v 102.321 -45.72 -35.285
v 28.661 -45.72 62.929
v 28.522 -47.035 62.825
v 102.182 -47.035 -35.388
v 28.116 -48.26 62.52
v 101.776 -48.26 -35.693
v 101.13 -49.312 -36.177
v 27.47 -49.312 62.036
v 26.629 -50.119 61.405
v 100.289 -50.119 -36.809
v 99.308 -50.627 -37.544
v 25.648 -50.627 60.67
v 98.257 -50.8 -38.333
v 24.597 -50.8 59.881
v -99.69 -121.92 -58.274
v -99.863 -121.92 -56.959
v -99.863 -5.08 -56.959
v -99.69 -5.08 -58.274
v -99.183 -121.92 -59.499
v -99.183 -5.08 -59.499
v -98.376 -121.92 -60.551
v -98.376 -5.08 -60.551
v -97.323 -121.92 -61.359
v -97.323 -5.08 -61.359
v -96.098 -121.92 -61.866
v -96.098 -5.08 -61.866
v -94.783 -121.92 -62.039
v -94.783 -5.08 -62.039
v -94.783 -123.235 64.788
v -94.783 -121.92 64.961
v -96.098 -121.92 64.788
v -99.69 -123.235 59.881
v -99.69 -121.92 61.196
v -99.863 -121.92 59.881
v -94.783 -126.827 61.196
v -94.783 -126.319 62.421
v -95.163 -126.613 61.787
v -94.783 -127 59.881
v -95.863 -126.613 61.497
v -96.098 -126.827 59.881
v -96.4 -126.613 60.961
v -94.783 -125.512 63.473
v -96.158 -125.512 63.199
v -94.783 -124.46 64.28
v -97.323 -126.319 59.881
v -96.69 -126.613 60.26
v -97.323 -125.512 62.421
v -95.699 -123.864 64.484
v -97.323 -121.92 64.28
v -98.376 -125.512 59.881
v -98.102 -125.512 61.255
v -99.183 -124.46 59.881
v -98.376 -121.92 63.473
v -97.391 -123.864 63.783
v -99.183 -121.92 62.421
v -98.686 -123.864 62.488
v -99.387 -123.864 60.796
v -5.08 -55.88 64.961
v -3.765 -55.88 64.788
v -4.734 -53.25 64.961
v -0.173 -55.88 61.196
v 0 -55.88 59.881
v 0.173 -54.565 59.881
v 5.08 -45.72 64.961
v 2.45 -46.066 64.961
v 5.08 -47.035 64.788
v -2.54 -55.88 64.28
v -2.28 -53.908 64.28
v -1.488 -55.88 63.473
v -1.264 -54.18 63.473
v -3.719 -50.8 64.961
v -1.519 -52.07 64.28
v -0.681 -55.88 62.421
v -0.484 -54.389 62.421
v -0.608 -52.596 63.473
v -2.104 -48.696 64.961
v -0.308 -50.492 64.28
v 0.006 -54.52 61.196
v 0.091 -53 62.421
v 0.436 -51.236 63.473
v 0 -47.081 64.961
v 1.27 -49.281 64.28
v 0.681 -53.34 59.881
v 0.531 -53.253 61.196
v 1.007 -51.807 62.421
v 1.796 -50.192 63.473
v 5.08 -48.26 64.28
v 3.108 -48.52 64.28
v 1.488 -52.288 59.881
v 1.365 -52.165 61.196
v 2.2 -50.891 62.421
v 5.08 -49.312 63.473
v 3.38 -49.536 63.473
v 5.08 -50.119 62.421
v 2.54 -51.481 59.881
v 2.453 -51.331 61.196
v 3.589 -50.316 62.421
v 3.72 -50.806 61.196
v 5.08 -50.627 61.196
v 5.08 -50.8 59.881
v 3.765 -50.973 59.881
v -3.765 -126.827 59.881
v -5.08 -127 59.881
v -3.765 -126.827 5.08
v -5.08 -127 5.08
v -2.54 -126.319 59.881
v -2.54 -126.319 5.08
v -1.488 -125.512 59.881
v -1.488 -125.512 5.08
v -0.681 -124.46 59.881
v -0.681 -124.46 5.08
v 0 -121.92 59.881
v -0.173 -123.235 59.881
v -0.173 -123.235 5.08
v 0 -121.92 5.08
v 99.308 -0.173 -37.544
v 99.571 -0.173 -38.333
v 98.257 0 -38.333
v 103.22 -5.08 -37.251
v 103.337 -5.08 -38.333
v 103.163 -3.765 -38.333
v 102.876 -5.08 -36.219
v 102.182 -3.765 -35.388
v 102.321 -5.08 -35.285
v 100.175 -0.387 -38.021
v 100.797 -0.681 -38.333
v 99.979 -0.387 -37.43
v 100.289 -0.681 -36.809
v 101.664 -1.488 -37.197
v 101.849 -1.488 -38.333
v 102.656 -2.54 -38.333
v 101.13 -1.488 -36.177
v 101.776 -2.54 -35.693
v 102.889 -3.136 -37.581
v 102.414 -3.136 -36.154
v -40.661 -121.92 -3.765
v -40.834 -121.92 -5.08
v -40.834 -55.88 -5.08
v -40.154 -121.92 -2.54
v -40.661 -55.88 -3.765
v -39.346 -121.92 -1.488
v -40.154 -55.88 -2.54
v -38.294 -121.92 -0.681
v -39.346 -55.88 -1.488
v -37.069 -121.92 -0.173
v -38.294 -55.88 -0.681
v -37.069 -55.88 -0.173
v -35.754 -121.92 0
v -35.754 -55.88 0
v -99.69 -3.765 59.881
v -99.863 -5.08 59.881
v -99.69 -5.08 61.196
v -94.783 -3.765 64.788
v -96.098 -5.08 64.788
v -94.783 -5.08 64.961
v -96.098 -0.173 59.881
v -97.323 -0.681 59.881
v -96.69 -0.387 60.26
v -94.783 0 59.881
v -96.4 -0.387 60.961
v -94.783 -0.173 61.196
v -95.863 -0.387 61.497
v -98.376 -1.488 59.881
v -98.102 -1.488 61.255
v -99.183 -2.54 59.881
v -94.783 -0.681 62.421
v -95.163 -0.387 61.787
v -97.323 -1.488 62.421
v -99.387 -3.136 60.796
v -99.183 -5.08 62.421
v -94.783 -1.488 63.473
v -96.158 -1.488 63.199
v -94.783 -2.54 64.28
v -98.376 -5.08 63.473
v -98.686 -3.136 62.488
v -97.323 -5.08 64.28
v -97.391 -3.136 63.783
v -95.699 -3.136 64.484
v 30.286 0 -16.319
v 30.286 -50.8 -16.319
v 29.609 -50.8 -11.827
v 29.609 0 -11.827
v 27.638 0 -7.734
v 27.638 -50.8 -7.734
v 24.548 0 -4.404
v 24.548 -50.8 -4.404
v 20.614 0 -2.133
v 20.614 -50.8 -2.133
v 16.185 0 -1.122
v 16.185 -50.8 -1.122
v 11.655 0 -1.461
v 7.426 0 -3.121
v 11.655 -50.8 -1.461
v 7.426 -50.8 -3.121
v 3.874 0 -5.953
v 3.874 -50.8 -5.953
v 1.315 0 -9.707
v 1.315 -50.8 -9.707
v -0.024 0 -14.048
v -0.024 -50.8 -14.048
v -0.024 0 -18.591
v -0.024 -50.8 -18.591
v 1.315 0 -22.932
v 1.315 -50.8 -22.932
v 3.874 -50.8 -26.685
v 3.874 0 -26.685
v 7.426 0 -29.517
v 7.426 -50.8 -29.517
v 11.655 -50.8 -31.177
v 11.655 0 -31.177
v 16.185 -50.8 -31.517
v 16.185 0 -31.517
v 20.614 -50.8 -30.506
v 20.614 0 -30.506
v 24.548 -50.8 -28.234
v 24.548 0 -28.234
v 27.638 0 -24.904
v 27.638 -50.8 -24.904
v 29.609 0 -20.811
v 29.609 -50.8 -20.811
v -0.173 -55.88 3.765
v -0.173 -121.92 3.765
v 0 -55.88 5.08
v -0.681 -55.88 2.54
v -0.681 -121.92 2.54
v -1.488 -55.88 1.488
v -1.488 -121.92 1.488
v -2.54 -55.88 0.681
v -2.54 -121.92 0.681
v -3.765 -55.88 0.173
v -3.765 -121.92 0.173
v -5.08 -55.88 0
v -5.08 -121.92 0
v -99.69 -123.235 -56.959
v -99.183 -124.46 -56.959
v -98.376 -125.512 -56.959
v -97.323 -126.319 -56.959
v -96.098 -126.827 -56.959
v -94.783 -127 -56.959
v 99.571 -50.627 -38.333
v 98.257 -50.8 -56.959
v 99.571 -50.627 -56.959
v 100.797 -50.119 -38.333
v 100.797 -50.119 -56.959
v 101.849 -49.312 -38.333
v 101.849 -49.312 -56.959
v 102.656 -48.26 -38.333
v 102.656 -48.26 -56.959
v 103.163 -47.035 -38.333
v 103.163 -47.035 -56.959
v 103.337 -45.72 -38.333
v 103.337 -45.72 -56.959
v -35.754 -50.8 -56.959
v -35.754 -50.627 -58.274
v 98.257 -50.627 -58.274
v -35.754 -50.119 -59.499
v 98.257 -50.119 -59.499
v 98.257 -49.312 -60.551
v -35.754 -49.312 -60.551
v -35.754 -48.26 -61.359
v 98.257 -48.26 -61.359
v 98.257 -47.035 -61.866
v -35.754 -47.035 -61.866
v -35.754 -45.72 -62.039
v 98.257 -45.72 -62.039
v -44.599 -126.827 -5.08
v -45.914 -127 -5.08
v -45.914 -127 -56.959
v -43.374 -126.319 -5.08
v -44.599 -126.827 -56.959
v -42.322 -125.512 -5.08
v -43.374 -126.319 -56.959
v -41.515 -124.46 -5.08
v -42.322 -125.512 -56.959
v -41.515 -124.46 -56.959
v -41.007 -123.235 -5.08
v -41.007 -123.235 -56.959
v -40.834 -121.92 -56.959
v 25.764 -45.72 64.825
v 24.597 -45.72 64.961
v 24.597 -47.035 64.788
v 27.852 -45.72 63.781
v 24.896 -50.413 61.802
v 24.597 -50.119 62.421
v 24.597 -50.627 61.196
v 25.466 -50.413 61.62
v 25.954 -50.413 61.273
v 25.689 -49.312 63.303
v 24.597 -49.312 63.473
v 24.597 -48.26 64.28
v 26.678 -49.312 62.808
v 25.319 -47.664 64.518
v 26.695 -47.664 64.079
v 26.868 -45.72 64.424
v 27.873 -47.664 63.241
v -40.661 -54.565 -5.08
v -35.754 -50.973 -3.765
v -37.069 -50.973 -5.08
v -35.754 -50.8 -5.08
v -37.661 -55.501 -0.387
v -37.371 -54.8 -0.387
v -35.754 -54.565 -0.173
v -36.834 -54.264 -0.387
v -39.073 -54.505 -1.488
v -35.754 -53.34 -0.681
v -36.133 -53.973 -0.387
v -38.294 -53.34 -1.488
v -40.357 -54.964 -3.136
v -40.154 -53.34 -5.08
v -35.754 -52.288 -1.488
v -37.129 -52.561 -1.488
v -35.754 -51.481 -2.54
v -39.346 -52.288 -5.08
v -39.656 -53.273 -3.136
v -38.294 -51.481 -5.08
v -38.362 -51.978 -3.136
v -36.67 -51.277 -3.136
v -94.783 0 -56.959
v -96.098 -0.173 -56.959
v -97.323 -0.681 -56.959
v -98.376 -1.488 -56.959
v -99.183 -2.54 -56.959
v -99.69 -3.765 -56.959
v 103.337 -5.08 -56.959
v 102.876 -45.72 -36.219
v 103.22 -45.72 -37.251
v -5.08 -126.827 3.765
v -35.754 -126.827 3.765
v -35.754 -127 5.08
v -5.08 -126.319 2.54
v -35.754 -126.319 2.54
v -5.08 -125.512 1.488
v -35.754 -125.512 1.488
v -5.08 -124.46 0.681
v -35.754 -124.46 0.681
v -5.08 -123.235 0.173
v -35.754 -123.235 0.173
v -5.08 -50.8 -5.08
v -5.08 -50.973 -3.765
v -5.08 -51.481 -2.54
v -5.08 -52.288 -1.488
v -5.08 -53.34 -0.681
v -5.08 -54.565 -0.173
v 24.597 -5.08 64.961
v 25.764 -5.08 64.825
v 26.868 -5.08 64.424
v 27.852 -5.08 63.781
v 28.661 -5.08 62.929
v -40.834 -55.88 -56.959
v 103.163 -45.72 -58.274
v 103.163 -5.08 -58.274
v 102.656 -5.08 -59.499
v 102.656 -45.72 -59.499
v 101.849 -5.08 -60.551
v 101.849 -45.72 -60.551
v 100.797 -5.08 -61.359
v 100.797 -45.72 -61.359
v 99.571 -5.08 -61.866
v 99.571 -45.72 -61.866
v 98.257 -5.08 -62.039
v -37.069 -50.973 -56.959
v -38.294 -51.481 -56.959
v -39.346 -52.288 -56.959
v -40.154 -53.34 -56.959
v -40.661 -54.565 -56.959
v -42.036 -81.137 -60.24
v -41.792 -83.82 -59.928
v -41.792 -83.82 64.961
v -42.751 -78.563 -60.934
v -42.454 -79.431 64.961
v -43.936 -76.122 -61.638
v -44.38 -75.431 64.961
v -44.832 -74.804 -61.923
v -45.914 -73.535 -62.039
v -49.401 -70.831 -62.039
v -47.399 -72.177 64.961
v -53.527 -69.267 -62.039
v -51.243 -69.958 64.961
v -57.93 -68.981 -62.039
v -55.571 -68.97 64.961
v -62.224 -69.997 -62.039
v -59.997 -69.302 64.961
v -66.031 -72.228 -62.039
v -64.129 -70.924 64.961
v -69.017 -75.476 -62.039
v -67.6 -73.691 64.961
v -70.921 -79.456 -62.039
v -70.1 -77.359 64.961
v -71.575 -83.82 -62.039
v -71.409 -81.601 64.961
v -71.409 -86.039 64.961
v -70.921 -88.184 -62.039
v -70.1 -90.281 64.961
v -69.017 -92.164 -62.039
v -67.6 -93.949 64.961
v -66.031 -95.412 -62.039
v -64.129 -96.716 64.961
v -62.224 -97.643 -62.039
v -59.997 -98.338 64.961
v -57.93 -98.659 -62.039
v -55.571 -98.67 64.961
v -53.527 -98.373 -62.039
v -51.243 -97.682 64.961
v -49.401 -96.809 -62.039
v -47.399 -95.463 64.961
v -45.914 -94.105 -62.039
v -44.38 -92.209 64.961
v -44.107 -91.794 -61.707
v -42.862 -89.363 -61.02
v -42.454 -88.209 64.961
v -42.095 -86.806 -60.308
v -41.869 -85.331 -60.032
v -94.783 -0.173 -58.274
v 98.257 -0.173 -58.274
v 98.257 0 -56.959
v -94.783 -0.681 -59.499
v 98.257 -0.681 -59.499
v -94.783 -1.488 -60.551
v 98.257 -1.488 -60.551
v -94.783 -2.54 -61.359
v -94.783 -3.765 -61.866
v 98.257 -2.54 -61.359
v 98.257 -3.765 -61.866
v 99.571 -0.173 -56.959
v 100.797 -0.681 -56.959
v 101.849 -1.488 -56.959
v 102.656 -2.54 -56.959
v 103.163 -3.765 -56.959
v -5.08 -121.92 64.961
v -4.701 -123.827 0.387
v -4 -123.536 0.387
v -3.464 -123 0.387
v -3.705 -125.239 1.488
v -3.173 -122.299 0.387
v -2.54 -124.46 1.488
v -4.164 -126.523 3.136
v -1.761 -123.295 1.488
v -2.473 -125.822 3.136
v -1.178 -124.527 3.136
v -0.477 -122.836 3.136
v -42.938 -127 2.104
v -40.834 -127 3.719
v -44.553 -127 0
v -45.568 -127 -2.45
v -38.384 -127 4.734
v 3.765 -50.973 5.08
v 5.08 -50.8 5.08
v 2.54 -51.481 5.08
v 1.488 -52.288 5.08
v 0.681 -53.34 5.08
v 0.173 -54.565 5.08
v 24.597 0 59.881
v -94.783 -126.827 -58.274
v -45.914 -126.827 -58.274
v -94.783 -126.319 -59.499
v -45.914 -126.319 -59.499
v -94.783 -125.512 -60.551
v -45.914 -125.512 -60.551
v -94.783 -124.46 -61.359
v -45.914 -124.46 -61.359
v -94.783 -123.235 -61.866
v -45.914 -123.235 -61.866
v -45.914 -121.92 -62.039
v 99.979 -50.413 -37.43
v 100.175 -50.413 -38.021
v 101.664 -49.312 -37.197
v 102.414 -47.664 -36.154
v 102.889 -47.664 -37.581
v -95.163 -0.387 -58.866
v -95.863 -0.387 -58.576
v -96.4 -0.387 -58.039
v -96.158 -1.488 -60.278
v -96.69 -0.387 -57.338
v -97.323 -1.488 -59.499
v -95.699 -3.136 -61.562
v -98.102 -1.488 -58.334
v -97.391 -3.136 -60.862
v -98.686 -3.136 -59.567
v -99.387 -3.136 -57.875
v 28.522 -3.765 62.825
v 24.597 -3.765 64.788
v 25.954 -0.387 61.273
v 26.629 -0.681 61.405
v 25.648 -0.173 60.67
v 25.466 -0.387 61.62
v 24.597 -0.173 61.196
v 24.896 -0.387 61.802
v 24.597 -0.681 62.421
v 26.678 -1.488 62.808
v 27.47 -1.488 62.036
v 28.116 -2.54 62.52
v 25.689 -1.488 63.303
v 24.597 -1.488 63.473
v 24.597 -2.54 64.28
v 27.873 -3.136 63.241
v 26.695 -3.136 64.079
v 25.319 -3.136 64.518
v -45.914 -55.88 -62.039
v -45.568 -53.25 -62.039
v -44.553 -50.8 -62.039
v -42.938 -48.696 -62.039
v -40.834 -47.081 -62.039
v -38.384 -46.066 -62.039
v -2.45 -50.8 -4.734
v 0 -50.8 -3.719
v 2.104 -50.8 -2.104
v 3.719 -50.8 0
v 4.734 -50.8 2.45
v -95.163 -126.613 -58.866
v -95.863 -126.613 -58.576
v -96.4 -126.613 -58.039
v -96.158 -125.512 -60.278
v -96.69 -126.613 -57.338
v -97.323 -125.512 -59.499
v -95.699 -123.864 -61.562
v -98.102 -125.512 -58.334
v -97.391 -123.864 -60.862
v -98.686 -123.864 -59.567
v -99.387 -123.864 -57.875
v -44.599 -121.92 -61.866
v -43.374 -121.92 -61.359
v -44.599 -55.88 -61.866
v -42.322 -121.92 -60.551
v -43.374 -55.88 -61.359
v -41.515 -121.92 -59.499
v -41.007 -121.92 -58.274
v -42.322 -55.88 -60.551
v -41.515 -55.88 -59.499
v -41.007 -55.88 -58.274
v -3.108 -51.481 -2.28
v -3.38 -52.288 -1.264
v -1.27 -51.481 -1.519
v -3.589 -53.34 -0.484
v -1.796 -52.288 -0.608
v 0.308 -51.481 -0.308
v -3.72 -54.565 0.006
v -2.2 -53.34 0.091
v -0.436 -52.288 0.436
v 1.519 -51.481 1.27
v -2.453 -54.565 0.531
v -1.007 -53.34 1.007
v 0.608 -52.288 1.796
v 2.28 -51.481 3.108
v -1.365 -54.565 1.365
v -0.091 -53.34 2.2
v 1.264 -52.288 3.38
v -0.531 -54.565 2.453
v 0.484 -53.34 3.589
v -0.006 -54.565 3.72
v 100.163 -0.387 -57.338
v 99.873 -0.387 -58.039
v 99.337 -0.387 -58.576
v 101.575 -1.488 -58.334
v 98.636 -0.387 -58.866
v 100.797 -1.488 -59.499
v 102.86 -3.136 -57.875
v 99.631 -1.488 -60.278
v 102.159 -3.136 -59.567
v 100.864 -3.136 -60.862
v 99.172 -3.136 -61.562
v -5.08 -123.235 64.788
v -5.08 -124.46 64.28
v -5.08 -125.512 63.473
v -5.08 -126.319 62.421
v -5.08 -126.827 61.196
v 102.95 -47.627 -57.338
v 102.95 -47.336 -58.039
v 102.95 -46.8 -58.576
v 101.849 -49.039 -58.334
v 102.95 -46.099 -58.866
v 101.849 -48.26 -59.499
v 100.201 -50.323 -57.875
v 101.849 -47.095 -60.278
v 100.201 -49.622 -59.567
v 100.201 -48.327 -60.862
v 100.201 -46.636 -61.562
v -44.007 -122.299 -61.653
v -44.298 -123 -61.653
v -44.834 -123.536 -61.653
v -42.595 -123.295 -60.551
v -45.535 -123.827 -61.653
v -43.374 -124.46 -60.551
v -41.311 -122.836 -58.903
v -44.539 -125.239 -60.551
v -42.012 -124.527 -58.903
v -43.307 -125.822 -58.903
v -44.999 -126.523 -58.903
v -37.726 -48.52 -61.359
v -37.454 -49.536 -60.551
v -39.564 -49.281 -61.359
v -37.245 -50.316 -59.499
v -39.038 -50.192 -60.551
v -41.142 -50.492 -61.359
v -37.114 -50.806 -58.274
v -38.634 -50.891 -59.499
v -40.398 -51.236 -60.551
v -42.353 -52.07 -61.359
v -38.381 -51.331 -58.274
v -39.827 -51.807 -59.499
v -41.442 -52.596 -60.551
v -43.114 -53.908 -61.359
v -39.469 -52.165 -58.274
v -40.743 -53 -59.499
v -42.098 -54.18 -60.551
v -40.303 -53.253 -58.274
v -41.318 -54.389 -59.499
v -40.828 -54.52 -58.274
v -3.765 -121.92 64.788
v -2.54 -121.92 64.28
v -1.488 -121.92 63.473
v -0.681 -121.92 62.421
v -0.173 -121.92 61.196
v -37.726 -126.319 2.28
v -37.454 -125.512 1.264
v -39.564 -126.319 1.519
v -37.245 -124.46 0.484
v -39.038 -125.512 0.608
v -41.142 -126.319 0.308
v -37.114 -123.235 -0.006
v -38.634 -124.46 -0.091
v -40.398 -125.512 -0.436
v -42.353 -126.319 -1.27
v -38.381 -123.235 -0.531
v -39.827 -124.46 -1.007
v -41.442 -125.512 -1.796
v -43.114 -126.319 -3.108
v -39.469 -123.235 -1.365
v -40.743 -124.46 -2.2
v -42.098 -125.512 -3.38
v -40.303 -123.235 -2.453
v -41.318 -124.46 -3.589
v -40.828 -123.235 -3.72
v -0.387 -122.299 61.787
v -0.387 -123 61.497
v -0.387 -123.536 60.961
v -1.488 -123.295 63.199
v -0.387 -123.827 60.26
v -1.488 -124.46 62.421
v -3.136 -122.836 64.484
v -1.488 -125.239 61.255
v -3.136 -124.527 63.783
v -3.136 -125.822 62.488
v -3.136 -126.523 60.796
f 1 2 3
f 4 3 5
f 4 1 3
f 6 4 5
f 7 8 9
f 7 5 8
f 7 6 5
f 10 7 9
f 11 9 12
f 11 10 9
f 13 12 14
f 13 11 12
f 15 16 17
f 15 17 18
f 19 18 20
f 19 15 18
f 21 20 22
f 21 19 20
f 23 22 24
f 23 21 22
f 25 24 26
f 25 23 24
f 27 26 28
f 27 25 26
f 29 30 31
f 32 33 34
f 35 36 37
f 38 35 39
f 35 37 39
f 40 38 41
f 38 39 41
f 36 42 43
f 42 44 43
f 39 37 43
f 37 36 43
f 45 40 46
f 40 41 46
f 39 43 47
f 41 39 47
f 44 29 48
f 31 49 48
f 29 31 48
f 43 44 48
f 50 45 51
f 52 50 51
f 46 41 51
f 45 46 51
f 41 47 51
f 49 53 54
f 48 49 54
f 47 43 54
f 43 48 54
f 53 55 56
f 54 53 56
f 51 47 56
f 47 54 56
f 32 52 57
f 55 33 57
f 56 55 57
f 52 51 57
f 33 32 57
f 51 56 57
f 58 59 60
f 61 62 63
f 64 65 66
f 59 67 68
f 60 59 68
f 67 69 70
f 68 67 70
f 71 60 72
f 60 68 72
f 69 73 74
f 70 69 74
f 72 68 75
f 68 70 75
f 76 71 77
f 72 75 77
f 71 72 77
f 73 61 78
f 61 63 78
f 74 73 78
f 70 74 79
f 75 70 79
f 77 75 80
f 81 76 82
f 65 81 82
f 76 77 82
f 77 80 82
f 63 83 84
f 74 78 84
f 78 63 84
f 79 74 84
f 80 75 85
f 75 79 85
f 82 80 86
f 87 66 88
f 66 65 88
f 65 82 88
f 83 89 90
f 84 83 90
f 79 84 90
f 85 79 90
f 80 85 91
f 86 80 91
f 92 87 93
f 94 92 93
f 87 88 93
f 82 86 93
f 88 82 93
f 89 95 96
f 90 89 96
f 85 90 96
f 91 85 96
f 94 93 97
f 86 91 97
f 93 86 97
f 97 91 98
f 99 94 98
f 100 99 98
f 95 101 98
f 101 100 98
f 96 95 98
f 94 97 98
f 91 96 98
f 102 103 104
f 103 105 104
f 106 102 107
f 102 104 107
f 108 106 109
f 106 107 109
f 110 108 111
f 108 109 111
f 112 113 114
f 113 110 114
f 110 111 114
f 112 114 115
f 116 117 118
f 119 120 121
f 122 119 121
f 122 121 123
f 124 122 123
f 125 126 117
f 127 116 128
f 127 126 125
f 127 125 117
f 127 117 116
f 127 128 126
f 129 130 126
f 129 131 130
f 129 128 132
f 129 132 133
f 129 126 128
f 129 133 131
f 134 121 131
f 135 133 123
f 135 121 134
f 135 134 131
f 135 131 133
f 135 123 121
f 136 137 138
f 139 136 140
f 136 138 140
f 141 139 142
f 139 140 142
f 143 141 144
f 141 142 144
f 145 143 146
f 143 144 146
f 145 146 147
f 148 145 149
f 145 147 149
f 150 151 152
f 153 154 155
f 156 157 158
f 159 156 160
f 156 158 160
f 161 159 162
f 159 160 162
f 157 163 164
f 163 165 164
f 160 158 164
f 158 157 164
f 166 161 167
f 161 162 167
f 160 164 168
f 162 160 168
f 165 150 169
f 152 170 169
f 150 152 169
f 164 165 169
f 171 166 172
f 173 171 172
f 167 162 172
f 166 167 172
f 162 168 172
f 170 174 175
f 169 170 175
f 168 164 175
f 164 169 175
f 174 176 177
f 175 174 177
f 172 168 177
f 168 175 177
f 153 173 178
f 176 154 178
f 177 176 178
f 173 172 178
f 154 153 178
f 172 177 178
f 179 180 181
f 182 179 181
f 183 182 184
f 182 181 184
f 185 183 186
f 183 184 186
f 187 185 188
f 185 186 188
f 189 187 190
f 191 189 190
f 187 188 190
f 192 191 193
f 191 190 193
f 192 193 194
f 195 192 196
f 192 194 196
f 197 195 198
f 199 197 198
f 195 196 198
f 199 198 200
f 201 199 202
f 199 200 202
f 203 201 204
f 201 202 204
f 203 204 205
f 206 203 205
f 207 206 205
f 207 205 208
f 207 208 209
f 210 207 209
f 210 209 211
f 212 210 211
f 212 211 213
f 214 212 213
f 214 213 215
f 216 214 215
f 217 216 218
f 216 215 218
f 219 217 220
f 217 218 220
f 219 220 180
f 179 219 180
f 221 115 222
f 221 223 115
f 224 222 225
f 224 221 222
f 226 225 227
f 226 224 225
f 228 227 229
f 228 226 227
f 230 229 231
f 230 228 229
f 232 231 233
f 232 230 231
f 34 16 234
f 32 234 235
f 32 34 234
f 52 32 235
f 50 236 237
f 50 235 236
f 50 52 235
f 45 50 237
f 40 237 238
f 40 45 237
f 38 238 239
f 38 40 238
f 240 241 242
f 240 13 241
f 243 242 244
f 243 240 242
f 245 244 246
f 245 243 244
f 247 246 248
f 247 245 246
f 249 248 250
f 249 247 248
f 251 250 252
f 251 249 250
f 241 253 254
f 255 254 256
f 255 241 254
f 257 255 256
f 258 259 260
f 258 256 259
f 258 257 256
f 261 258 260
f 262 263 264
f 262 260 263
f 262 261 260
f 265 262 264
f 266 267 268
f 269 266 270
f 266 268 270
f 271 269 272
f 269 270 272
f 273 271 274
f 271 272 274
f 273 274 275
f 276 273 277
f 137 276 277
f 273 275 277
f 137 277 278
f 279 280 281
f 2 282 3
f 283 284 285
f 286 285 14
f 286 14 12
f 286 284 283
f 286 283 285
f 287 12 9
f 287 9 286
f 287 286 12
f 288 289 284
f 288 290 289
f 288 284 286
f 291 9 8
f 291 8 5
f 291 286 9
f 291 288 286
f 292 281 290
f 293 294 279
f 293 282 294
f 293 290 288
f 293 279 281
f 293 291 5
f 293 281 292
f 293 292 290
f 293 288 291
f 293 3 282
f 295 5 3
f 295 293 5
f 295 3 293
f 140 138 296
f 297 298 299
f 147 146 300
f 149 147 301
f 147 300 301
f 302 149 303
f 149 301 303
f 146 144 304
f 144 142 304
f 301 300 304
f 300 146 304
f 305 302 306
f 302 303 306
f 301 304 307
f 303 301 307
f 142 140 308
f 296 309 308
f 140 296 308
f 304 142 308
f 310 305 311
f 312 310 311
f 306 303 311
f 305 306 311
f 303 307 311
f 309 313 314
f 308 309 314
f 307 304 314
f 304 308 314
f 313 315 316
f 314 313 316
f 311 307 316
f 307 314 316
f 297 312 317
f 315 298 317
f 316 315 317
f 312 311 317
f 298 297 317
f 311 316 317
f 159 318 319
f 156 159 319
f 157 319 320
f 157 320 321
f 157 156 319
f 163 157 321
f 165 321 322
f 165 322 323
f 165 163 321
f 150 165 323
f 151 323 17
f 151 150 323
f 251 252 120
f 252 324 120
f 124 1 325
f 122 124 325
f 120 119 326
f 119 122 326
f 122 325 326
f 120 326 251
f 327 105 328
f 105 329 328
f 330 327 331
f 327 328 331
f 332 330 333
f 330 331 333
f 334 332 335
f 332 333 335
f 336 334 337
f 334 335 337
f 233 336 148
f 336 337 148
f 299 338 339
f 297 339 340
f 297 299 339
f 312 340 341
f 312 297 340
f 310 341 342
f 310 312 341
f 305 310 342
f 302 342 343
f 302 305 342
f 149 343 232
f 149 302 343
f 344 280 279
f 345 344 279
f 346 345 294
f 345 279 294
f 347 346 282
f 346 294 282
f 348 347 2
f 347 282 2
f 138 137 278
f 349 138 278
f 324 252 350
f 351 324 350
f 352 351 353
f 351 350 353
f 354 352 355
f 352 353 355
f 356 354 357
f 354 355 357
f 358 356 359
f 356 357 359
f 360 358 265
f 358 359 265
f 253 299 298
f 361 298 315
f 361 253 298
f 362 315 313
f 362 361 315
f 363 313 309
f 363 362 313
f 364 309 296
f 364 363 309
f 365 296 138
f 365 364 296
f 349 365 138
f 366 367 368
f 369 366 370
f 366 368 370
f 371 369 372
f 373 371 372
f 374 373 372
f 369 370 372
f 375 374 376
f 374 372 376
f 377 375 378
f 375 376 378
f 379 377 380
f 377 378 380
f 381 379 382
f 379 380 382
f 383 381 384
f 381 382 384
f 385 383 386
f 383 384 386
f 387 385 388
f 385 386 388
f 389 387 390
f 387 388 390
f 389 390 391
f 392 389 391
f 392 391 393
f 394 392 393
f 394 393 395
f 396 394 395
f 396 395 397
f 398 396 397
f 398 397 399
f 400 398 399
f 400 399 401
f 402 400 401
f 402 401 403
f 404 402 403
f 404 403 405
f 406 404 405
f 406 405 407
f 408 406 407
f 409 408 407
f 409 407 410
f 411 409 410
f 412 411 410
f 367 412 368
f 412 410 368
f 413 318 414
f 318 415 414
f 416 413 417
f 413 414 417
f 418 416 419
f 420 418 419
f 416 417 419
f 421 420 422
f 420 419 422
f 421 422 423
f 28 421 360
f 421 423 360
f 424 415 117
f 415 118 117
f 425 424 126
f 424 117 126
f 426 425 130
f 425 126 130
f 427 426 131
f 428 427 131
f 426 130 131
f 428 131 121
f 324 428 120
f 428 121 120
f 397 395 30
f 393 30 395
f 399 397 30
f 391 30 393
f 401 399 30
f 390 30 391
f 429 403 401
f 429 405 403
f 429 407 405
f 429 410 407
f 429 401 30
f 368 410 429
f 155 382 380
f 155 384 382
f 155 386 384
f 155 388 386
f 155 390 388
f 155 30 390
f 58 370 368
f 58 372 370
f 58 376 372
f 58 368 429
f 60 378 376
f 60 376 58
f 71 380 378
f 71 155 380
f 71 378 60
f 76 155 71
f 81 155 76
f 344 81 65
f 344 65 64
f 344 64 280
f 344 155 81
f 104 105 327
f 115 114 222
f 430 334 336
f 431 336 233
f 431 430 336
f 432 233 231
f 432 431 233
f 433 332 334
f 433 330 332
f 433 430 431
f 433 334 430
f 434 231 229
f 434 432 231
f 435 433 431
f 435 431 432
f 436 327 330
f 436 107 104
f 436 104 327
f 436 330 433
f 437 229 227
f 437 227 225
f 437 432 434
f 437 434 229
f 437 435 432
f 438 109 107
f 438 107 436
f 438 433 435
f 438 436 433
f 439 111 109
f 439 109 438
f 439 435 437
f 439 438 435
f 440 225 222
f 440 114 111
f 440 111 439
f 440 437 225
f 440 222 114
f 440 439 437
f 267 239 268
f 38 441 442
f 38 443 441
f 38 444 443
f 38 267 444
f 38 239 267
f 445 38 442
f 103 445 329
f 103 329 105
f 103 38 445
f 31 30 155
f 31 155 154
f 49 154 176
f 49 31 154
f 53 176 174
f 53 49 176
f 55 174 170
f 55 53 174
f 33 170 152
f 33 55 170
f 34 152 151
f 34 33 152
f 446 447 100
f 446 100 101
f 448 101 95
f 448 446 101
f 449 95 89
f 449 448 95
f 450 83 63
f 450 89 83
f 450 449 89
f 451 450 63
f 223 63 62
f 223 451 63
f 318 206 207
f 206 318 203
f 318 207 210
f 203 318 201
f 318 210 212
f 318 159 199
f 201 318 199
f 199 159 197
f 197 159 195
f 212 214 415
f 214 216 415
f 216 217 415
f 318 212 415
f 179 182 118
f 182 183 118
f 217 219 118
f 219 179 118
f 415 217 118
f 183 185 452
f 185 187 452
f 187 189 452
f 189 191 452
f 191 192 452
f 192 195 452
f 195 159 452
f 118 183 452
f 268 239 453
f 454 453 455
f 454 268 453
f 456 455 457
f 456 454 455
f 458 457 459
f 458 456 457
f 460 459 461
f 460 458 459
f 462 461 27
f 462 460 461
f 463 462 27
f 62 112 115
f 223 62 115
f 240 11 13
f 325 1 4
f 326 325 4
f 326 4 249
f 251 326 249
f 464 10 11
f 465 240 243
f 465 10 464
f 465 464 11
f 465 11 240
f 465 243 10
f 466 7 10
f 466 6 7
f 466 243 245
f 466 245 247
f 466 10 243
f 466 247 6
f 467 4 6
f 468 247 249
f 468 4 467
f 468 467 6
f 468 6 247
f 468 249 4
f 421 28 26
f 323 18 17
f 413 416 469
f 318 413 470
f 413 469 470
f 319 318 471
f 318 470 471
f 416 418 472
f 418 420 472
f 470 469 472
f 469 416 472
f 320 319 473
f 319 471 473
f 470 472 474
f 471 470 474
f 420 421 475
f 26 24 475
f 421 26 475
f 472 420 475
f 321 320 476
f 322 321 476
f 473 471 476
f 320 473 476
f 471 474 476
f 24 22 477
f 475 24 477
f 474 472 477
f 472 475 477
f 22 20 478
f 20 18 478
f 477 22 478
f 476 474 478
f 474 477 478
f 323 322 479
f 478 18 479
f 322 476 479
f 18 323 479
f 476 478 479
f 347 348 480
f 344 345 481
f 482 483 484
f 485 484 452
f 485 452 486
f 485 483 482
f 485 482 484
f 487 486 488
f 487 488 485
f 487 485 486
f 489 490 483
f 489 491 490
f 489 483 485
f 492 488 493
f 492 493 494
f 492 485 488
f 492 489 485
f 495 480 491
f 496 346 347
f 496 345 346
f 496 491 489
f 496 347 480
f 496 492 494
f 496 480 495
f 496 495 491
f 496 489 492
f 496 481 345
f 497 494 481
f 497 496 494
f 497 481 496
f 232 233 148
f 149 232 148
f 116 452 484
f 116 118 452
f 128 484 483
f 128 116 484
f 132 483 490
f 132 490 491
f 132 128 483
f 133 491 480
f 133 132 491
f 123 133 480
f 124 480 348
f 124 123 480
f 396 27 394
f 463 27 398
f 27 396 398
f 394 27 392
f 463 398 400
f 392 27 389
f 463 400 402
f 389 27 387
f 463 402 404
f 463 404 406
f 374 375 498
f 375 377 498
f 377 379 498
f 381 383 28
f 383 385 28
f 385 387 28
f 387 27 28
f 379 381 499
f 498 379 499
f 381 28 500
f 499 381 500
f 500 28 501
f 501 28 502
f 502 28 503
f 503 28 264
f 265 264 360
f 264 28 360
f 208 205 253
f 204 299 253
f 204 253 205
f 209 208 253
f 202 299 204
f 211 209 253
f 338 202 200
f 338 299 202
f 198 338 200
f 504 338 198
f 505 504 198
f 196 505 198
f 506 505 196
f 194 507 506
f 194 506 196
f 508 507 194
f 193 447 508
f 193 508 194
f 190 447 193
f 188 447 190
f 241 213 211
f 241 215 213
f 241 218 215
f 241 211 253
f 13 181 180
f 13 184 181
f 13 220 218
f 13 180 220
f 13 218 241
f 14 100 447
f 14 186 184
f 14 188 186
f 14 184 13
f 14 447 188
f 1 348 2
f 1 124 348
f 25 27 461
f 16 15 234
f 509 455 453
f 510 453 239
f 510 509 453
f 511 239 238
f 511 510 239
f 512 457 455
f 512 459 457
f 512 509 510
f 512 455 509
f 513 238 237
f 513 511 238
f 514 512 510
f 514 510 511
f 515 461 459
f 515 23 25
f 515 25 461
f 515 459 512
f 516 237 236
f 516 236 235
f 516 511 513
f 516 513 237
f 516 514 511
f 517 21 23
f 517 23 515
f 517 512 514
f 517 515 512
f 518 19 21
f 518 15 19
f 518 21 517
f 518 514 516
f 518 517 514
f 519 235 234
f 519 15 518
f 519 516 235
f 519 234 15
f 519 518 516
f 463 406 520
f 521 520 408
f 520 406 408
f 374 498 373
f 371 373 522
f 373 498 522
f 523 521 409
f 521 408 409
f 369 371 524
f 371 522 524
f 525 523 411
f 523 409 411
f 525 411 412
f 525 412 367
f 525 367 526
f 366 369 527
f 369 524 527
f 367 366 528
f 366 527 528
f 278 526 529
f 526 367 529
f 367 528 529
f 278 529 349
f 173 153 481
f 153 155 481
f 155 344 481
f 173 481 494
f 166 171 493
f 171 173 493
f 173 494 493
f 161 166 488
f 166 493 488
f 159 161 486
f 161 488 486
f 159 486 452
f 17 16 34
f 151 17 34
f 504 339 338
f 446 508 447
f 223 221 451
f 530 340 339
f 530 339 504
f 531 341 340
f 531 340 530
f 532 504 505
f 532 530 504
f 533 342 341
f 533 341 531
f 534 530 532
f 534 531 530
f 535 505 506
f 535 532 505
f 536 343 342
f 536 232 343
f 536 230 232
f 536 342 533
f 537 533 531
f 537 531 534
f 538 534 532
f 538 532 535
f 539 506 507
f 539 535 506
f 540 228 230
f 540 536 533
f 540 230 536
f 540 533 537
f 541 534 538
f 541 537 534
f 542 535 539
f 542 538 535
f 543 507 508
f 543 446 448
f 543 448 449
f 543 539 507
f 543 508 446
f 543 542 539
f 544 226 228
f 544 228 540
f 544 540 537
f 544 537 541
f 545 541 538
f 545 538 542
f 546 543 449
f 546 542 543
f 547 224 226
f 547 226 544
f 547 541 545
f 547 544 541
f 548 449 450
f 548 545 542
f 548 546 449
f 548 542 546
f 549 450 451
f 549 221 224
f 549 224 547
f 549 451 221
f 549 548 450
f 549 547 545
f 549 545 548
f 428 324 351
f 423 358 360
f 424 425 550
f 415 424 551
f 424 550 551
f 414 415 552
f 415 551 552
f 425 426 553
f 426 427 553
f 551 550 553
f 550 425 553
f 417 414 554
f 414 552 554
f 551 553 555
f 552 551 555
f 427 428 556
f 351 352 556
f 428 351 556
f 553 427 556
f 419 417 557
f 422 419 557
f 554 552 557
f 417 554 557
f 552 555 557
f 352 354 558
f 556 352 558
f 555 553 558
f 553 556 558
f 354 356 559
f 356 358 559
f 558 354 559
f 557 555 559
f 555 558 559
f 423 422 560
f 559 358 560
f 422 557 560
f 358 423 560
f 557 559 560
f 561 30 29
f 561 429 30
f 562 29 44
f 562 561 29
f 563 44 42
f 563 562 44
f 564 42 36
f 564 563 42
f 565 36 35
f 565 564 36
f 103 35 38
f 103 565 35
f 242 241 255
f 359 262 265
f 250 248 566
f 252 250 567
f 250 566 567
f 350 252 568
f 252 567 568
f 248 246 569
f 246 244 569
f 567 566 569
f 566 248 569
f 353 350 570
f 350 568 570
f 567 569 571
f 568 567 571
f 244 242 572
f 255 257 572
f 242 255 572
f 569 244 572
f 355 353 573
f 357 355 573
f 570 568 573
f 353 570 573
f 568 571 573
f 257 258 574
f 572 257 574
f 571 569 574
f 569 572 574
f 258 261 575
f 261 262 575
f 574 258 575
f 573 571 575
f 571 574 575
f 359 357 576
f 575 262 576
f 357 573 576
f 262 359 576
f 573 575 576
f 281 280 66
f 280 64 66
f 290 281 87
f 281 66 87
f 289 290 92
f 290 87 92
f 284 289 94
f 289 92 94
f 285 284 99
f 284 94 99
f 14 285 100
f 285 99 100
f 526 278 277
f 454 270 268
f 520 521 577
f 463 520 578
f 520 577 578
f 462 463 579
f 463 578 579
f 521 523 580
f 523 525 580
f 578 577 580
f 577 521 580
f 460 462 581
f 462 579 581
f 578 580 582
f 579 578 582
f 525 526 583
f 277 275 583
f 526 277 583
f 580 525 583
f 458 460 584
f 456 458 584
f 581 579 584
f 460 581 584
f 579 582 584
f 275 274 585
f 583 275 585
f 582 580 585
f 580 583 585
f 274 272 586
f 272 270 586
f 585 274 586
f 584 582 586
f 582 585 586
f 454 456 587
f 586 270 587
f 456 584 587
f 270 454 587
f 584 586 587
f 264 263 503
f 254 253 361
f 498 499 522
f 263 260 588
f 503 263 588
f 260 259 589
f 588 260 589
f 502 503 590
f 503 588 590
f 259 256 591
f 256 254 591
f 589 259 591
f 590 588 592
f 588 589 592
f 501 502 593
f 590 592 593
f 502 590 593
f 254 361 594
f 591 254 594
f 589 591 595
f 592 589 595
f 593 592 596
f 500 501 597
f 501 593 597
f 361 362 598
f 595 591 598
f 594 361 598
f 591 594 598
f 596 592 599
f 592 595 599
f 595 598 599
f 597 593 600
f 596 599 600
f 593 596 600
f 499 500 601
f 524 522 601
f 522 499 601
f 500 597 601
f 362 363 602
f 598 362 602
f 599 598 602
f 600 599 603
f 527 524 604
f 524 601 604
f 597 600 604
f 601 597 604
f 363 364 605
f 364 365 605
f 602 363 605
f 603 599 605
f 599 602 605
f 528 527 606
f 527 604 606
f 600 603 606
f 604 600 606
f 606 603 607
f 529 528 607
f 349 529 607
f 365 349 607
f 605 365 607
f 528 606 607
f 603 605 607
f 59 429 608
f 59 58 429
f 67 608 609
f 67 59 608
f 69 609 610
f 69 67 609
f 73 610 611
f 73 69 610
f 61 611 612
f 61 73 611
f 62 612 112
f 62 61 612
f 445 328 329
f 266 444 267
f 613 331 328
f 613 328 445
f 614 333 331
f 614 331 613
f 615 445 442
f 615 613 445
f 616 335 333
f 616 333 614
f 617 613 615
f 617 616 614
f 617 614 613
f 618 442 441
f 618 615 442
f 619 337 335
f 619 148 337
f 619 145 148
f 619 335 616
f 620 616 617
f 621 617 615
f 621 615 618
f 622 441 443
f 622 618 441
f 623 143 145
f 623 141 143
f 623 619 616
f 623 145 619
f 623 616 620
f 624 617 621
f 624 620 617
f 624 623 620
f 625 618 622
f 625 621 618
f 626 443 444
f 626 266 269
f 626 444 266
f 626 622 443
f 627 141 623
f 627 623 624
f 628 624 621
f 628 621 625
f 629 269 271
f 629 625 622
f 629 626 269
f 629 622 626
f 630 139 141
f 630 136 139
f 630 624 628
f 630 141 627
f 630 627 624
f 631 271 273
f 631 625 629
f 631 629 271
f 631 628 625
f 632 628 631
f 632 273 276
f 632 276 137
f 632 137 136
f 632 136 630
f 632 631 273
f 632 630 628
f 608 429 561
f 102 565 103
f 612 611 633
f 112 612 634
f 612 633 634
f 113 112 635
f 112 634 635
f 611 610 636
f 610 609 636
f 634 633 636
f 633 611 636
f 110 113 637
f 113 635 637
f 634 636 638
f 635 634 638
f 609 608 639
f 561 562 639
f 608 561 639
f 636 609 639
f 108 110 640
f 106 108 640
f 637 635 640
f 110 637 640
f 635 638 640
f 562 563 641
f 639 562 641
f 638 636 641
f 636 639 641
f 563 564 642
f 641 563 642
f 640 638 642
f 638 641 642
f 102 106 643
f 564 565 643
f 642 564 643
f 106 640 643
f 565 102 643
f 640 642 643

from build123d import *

# Parameters (mm, degrees)
F0_W     = 203.2
F0_H     = 127
F1_DEPTH = 127
F3_DEPTH = 76.2
F4_SIZE2 = 101.6
F4_SIZE  = 76.2
F5_R     = 5.08
F6_R     = 15.24
F7_DEPTH = 50.8
F8_R     = 14.8914565461
F9_DEPTH = 127


with BuildPart() as f1:
    # F0 (on Front) → F1 (new body)
    with BuildSketch(Plane.XZ):
        with Locations((1.736553802, 1.4607831836)):
            Rectangle(F0_W, F0_H)
    extrude(amount=F1_DEPTH)

    # F2 (on face) → F3 (cut)
    with BuildSketch(Plane.XZ.offset(127)):
        Polygon((0, 64.9607831836), (0, 0), (-40.8341363072, 0), (-40.8341363072, -62.0392168164), (103.336553802, -62.0392168164), (103.336553802, 64.9607831836), align=None)
    extrude(amount=-F3_DEPTH, mode=Mode.SUBTRACT)

    # F4
    f4_edges = [f1.edges().sort_by_distance(p)[0] for p in [
        (103.336554, -25.4, 64.960783),
    ]]
    f4_side = f1.faces().sort_by_distance((-20.189124, -52.346525, 64.960783))[0]
    chamfer(f4_edges, length=F4_SIZE, length2=F4_SIZE2, reference=f4_side)

    # F5
    f5_edges = [f1.edges().sort_by_distance(p)[0] for p in [
        (-99.863446, -63.5, 64.960783),
        (-49.931723, -127, 64.960783),
        (0, -88.9, 64.960783),
        (27.136554, -25.4, 64.960783),
        (13.568277, -50.8, 64.960783),
        (65.236554, -50.8, 14.160783),
        (0, -50.8, 32.480392),
        (0, -127, 32.480392),
        (31.251209, -50.8, -62.039217),
        (103.336554, -50.8, -49.339217),
        (103.336554, -25.4, -36.639217),
        (103.336554, -25.4, -62.039217),
        (103.336554, 0, -49.339217),
        (65.236554, 0, 14.160783),
        (-20.417068, -127, 0),
        (-40.834136, -127, -31.019608),
        (-40.834136, -88.9, -62.039217),
        (-40.834136, -50.8, -31.019608),
        (0, -88.9, 0),
        (-40.834136, -88.9, 0),
        (-99.863446, -63.5, -62.039217),
        (-70.348791, -127, -62.039217),
        (1.736554, 0, -62.039217),
        (-99.863446, -127, 1.460783),
        (-99.863446, 0, 1.460783),
        (-36.363446, 0, 64.960783),
        (-20.417068, -50.8, 0),
    ]]
    fillet(f5_edges, radius=F5_R)

    # F6 (on face) → F7 (cut, through all)
    with BuildSketch(Plane.XZ.offset(50.8)):
        with Locations((15.0458636928, -16.3192168164)):
            Circle(F6_R)
    extrude(amount=-F7_DEPTH, mode=Mode.SUBTRACT)

    # F8 (on face) → F9 (cut, through all)
    with BuildSketch(Plane.XY.offset(64.9607831836)):
        with Locations((-56.683446198, -83.82)):
            Circle(F8_R)
    extrude(amount=-F9_DEPTH, mode=Mode.SUBTRACT)


solid = f1.part
